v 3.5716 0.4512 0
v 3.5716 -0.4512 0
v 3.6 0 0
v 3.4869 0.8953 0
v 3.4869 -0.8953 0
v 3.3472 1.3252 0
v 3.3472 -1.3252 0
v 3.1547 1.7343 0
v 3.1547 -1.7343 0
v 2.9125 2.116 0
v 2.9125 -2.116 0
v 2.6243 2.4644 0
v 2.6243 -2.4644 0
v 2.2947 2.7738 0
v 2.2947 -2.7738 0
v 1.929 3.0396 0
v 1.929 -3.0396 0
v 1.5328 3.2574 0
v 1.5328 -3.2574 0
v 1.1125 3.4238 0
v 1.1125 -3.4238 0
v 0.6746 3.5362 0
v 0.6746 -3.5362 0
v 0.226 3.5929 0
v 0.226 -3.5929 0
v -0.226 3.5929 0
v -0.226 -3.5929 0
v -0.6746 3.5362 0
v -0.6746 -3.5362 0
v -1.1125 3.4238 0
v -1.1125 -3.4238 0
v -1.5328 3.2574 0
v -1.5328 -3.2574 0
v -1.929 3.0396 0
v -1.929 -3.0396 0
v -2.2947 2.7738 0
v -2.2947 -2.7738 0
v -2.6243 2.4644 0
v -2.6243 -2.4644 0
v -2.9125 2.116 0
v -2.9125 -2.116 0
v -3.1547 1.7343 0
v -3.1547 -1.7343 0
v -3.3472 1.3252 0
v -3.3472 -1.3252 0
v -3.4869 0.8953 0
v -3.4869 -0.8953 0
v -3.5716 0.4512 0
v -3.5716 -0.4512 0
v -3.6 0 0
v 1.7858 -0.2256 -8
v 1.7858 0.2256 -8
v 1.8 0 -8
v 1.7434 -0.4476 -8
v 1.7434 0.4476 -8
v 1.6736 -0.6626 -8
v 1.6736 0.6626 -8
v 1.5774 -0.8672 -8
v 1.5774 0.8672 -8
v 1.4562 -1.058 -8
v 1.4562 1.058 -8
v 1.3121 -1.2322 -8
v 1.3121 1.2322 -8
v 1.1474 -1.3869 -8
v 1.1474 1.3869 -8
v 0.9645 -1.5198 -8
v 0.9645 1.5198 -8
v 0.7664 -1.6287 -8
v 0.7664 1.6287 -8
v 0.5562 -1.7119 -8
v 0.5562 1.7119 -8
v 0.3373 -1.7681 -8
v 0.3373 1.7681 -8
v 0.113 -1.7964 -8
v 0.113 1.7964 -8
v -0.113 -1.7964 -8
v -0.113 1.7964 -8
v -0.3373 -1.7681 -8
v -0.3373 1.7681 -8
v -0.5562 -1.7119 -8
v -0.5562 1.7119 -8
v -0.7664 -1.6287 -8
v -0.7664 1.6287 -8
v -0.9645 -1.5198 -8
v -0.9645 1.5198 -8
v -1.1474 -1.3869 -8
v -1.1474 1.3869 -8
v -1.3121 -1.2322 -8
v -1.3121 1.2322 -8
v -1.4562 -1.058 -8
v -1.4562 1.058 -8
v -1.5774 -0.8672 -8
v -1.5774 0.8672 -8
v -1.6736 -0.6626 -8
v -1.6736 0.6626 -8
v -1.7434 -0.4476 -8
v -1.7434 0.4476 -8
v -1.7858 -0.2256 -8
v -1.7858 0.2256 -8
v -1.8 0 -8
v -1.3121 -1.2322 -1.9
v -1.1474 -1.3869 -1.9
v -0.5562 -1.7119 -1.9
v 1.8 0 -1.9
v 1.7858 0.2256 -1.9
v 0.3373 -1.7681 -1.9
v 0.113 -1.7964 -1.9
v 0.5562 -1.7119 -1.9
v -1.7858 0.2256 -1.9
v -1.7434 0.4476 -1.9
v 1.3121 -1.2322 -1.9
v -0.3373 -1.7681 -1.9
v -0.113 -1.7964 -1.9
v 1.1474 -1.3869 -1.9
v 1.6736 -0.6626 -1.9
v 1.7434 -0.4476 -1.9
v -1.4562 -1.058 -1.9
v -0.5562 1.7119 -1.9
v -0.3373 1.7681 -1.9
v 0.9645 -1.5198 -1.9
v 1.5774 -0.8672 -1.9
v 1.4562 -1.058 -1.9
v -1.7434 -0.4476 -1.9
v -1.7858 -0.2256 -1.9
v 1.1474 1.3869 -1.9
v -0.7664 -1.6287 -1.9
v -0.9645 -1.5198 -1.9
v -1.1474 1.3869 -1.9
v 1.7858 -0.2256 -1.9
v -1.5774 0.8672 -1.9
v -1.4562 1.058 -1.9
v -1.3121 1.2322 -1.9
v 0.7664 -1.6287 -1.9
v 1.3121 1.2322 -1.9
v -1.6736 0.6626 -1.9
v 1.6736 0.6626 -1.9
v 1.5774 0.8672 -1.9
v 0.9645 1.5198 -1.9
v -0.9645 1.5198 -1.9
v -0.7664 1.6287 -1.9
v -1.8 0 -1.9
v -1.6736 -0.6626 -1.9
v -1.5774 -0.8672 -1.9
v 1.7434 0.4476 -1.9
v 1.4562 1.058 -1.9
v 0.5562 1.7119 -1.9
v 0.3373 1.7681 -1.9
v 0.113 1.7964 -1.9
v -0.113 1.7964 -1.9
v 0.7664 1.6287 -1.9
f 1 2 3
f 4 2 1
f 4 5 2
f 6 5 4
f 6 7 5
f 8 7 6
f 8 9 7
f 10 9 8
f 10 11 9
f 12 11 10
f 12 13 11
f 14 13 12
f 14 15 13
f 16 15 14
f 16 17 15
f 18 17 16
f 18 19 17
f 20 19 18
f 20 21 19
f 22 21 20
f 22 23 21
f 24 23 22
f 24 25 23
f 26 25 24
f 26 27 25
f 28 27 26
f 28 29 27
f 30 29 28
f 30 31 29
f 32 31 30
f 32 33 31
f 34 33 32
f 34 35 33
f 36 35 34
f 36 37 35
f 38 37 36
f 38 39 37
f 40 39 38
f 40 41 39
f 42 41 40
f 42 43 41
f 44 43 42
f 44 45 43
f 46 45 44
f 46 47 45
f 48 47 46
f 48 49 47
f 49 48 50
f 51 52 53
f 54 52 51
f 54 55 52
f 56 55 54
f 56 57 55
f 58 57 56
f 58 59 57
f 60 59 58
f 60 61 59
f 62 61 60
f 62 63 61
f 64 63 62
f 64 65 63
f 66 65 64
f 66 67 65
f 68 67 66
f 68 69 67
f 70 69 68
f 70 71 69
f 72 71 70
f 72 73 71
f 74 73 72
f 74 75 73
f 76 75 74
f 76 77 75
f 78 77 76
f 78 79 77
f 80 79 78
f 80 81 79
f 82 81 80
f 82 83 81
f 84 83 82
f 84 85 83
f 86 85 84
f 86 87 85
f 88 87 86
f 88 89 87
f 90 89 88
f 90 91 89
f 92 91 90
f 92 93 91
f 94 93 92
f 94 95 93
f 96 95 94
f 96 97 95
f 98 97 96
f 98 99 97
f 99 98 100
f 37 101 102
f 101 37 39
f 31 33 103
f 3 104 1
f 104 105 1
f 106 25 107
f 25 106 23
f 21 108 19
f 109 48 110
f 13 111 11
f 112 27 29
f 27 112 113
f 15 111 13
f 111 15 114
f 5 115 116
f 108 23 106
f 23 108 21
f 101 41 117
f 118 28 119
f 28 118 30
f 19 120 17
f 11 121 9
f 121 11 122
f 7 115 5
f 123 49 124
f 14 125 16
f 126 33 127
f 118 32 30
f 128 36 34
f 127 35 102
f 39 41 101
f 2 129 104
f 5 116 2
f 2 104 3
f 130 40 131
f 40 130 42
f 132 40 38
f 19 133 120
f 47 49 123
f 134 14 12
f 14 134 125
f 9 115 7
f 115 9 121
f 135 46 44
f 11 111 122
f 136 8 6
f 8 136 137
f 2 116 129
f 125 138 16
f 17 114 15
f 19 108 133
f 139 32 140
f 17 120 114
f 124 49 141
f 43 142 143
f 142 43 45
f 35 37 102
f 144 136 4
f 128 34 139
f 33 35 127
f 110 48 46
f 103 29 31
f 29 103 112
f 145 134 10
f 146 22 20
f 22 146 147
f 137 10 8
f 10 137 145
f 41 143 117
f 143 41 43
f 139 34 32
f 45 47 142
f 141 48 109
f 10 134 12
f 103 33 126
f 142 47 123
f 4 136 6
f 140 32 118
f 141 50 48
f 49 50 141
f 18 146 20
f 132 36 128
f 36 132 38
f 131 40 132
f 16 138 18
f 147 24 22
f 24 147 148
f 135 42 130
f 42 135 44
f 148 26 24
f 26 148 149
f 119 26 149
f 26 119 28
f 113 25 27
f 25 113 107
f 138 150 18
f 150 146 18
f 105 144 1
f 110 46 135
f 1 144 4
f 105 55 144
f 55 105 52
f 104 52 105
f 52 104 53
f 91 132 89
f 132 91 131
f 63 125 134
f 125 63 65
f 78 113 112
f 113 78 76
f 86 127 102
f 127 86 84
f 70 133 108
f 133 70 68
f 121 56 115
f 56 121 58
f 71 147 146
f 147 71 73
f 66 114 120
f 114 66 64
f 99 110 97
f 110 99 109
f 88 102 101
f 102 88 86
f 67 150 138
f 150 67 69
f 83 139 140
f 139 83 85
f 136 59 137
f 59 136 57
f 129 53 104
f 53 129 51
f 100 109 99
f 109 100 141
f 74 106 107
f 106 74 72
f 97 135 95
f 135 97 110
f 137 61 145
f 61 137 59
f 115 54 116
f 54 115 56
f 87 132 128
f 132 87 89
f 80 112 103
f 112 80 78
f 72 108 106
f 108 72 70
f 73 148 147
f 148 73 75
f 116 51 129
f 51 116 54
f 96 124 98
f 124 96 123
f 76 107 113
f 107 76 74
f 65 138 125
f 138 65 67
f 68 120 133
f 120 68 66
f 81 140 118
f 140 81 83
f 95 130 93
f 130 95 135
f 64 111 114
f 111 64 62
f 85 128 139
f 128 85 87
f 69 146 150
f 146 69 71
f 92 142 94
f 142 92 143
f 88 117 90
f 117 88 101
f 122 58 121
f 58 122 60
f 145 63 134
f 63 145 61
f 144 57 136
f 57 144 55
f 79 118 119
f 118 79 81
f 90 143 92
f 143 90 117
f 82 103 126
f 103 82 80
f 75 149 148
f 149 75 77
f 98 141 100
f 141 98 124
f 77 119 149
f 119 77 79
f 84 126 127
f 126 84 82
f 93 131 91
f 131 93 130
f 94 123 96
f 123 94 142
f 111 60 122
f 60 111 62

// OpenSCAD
$fn = 50;


difference() {
	union() {
		translate(v = [0, 0, 0]) {
			rotate(a = [0, 0, 0]) {
				difference() {
					union() {
						translate(v = [0, 0, -8.0000000000]) {
							cylinder(h = 8, r = 1.5000000000);
						}
						translate(v = [0, 0, -1.9000000000]) {
							cylinder(h = 1.9000000000, r1 = 1.8000000000, r2 = 3.6000000000);
						}
						translate(v = [0, 0, -8.0000000000]) {
							cylinder(h = 8, r = 1.8000000000);
						}
						translate(v = [0, 0, -8.0000000000]) {
							cylinder(h = 8, r = 1.5000000000);
						}
					}
					union();
				}
			}
		}
	}
	union();
}
